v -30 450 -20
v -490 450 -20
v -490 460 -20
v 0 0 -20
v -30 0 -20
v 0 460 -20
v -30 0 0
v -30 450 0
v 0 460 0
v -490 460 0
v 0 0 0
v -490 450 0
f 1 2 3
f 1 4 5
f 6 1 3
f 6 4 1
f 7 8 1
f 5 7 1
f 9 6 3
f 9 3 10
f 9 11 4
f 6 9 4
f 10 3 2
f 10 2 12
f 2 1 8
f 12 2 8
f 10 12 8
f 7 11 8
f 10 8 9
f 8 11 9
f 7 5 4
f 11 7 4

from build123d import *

# Parameters (mm, degrees)
SKETCH_1_W      = 30
SKETCH_1_H      = 20
EXTRUDE_1_DEPTH = 460
SKETCH_2_W      = 20
SKETCH_2_H      = 10
EXTRUDE_2_DEPTH = 460


with BuildPart() as part:
    # 草图1 → 凸台-拉伸1 (new body)
    with BuildSketch(Plane(origin=(0, 0, 0), x_dir=(1, 0, 0), z_dir=(0, 1, 0))):
        with Locations((-15, 10)):
            Rectangle(SKETCH_1_W, SKETCH_1_H)
    extrude(amount=EXTRUDE_1_DEPTH)

    # 草图2 → 凸台-拉伸2 (add)
    with BuildSketch(Plane.ZY.offset(30)):
        with Locations((-10, 455)):
            Rectangle(SKETCH_2_W, SKETCH_2_H)
    extrude(amount=EXTRUDE_2_DEPTH)


solid = part.part
